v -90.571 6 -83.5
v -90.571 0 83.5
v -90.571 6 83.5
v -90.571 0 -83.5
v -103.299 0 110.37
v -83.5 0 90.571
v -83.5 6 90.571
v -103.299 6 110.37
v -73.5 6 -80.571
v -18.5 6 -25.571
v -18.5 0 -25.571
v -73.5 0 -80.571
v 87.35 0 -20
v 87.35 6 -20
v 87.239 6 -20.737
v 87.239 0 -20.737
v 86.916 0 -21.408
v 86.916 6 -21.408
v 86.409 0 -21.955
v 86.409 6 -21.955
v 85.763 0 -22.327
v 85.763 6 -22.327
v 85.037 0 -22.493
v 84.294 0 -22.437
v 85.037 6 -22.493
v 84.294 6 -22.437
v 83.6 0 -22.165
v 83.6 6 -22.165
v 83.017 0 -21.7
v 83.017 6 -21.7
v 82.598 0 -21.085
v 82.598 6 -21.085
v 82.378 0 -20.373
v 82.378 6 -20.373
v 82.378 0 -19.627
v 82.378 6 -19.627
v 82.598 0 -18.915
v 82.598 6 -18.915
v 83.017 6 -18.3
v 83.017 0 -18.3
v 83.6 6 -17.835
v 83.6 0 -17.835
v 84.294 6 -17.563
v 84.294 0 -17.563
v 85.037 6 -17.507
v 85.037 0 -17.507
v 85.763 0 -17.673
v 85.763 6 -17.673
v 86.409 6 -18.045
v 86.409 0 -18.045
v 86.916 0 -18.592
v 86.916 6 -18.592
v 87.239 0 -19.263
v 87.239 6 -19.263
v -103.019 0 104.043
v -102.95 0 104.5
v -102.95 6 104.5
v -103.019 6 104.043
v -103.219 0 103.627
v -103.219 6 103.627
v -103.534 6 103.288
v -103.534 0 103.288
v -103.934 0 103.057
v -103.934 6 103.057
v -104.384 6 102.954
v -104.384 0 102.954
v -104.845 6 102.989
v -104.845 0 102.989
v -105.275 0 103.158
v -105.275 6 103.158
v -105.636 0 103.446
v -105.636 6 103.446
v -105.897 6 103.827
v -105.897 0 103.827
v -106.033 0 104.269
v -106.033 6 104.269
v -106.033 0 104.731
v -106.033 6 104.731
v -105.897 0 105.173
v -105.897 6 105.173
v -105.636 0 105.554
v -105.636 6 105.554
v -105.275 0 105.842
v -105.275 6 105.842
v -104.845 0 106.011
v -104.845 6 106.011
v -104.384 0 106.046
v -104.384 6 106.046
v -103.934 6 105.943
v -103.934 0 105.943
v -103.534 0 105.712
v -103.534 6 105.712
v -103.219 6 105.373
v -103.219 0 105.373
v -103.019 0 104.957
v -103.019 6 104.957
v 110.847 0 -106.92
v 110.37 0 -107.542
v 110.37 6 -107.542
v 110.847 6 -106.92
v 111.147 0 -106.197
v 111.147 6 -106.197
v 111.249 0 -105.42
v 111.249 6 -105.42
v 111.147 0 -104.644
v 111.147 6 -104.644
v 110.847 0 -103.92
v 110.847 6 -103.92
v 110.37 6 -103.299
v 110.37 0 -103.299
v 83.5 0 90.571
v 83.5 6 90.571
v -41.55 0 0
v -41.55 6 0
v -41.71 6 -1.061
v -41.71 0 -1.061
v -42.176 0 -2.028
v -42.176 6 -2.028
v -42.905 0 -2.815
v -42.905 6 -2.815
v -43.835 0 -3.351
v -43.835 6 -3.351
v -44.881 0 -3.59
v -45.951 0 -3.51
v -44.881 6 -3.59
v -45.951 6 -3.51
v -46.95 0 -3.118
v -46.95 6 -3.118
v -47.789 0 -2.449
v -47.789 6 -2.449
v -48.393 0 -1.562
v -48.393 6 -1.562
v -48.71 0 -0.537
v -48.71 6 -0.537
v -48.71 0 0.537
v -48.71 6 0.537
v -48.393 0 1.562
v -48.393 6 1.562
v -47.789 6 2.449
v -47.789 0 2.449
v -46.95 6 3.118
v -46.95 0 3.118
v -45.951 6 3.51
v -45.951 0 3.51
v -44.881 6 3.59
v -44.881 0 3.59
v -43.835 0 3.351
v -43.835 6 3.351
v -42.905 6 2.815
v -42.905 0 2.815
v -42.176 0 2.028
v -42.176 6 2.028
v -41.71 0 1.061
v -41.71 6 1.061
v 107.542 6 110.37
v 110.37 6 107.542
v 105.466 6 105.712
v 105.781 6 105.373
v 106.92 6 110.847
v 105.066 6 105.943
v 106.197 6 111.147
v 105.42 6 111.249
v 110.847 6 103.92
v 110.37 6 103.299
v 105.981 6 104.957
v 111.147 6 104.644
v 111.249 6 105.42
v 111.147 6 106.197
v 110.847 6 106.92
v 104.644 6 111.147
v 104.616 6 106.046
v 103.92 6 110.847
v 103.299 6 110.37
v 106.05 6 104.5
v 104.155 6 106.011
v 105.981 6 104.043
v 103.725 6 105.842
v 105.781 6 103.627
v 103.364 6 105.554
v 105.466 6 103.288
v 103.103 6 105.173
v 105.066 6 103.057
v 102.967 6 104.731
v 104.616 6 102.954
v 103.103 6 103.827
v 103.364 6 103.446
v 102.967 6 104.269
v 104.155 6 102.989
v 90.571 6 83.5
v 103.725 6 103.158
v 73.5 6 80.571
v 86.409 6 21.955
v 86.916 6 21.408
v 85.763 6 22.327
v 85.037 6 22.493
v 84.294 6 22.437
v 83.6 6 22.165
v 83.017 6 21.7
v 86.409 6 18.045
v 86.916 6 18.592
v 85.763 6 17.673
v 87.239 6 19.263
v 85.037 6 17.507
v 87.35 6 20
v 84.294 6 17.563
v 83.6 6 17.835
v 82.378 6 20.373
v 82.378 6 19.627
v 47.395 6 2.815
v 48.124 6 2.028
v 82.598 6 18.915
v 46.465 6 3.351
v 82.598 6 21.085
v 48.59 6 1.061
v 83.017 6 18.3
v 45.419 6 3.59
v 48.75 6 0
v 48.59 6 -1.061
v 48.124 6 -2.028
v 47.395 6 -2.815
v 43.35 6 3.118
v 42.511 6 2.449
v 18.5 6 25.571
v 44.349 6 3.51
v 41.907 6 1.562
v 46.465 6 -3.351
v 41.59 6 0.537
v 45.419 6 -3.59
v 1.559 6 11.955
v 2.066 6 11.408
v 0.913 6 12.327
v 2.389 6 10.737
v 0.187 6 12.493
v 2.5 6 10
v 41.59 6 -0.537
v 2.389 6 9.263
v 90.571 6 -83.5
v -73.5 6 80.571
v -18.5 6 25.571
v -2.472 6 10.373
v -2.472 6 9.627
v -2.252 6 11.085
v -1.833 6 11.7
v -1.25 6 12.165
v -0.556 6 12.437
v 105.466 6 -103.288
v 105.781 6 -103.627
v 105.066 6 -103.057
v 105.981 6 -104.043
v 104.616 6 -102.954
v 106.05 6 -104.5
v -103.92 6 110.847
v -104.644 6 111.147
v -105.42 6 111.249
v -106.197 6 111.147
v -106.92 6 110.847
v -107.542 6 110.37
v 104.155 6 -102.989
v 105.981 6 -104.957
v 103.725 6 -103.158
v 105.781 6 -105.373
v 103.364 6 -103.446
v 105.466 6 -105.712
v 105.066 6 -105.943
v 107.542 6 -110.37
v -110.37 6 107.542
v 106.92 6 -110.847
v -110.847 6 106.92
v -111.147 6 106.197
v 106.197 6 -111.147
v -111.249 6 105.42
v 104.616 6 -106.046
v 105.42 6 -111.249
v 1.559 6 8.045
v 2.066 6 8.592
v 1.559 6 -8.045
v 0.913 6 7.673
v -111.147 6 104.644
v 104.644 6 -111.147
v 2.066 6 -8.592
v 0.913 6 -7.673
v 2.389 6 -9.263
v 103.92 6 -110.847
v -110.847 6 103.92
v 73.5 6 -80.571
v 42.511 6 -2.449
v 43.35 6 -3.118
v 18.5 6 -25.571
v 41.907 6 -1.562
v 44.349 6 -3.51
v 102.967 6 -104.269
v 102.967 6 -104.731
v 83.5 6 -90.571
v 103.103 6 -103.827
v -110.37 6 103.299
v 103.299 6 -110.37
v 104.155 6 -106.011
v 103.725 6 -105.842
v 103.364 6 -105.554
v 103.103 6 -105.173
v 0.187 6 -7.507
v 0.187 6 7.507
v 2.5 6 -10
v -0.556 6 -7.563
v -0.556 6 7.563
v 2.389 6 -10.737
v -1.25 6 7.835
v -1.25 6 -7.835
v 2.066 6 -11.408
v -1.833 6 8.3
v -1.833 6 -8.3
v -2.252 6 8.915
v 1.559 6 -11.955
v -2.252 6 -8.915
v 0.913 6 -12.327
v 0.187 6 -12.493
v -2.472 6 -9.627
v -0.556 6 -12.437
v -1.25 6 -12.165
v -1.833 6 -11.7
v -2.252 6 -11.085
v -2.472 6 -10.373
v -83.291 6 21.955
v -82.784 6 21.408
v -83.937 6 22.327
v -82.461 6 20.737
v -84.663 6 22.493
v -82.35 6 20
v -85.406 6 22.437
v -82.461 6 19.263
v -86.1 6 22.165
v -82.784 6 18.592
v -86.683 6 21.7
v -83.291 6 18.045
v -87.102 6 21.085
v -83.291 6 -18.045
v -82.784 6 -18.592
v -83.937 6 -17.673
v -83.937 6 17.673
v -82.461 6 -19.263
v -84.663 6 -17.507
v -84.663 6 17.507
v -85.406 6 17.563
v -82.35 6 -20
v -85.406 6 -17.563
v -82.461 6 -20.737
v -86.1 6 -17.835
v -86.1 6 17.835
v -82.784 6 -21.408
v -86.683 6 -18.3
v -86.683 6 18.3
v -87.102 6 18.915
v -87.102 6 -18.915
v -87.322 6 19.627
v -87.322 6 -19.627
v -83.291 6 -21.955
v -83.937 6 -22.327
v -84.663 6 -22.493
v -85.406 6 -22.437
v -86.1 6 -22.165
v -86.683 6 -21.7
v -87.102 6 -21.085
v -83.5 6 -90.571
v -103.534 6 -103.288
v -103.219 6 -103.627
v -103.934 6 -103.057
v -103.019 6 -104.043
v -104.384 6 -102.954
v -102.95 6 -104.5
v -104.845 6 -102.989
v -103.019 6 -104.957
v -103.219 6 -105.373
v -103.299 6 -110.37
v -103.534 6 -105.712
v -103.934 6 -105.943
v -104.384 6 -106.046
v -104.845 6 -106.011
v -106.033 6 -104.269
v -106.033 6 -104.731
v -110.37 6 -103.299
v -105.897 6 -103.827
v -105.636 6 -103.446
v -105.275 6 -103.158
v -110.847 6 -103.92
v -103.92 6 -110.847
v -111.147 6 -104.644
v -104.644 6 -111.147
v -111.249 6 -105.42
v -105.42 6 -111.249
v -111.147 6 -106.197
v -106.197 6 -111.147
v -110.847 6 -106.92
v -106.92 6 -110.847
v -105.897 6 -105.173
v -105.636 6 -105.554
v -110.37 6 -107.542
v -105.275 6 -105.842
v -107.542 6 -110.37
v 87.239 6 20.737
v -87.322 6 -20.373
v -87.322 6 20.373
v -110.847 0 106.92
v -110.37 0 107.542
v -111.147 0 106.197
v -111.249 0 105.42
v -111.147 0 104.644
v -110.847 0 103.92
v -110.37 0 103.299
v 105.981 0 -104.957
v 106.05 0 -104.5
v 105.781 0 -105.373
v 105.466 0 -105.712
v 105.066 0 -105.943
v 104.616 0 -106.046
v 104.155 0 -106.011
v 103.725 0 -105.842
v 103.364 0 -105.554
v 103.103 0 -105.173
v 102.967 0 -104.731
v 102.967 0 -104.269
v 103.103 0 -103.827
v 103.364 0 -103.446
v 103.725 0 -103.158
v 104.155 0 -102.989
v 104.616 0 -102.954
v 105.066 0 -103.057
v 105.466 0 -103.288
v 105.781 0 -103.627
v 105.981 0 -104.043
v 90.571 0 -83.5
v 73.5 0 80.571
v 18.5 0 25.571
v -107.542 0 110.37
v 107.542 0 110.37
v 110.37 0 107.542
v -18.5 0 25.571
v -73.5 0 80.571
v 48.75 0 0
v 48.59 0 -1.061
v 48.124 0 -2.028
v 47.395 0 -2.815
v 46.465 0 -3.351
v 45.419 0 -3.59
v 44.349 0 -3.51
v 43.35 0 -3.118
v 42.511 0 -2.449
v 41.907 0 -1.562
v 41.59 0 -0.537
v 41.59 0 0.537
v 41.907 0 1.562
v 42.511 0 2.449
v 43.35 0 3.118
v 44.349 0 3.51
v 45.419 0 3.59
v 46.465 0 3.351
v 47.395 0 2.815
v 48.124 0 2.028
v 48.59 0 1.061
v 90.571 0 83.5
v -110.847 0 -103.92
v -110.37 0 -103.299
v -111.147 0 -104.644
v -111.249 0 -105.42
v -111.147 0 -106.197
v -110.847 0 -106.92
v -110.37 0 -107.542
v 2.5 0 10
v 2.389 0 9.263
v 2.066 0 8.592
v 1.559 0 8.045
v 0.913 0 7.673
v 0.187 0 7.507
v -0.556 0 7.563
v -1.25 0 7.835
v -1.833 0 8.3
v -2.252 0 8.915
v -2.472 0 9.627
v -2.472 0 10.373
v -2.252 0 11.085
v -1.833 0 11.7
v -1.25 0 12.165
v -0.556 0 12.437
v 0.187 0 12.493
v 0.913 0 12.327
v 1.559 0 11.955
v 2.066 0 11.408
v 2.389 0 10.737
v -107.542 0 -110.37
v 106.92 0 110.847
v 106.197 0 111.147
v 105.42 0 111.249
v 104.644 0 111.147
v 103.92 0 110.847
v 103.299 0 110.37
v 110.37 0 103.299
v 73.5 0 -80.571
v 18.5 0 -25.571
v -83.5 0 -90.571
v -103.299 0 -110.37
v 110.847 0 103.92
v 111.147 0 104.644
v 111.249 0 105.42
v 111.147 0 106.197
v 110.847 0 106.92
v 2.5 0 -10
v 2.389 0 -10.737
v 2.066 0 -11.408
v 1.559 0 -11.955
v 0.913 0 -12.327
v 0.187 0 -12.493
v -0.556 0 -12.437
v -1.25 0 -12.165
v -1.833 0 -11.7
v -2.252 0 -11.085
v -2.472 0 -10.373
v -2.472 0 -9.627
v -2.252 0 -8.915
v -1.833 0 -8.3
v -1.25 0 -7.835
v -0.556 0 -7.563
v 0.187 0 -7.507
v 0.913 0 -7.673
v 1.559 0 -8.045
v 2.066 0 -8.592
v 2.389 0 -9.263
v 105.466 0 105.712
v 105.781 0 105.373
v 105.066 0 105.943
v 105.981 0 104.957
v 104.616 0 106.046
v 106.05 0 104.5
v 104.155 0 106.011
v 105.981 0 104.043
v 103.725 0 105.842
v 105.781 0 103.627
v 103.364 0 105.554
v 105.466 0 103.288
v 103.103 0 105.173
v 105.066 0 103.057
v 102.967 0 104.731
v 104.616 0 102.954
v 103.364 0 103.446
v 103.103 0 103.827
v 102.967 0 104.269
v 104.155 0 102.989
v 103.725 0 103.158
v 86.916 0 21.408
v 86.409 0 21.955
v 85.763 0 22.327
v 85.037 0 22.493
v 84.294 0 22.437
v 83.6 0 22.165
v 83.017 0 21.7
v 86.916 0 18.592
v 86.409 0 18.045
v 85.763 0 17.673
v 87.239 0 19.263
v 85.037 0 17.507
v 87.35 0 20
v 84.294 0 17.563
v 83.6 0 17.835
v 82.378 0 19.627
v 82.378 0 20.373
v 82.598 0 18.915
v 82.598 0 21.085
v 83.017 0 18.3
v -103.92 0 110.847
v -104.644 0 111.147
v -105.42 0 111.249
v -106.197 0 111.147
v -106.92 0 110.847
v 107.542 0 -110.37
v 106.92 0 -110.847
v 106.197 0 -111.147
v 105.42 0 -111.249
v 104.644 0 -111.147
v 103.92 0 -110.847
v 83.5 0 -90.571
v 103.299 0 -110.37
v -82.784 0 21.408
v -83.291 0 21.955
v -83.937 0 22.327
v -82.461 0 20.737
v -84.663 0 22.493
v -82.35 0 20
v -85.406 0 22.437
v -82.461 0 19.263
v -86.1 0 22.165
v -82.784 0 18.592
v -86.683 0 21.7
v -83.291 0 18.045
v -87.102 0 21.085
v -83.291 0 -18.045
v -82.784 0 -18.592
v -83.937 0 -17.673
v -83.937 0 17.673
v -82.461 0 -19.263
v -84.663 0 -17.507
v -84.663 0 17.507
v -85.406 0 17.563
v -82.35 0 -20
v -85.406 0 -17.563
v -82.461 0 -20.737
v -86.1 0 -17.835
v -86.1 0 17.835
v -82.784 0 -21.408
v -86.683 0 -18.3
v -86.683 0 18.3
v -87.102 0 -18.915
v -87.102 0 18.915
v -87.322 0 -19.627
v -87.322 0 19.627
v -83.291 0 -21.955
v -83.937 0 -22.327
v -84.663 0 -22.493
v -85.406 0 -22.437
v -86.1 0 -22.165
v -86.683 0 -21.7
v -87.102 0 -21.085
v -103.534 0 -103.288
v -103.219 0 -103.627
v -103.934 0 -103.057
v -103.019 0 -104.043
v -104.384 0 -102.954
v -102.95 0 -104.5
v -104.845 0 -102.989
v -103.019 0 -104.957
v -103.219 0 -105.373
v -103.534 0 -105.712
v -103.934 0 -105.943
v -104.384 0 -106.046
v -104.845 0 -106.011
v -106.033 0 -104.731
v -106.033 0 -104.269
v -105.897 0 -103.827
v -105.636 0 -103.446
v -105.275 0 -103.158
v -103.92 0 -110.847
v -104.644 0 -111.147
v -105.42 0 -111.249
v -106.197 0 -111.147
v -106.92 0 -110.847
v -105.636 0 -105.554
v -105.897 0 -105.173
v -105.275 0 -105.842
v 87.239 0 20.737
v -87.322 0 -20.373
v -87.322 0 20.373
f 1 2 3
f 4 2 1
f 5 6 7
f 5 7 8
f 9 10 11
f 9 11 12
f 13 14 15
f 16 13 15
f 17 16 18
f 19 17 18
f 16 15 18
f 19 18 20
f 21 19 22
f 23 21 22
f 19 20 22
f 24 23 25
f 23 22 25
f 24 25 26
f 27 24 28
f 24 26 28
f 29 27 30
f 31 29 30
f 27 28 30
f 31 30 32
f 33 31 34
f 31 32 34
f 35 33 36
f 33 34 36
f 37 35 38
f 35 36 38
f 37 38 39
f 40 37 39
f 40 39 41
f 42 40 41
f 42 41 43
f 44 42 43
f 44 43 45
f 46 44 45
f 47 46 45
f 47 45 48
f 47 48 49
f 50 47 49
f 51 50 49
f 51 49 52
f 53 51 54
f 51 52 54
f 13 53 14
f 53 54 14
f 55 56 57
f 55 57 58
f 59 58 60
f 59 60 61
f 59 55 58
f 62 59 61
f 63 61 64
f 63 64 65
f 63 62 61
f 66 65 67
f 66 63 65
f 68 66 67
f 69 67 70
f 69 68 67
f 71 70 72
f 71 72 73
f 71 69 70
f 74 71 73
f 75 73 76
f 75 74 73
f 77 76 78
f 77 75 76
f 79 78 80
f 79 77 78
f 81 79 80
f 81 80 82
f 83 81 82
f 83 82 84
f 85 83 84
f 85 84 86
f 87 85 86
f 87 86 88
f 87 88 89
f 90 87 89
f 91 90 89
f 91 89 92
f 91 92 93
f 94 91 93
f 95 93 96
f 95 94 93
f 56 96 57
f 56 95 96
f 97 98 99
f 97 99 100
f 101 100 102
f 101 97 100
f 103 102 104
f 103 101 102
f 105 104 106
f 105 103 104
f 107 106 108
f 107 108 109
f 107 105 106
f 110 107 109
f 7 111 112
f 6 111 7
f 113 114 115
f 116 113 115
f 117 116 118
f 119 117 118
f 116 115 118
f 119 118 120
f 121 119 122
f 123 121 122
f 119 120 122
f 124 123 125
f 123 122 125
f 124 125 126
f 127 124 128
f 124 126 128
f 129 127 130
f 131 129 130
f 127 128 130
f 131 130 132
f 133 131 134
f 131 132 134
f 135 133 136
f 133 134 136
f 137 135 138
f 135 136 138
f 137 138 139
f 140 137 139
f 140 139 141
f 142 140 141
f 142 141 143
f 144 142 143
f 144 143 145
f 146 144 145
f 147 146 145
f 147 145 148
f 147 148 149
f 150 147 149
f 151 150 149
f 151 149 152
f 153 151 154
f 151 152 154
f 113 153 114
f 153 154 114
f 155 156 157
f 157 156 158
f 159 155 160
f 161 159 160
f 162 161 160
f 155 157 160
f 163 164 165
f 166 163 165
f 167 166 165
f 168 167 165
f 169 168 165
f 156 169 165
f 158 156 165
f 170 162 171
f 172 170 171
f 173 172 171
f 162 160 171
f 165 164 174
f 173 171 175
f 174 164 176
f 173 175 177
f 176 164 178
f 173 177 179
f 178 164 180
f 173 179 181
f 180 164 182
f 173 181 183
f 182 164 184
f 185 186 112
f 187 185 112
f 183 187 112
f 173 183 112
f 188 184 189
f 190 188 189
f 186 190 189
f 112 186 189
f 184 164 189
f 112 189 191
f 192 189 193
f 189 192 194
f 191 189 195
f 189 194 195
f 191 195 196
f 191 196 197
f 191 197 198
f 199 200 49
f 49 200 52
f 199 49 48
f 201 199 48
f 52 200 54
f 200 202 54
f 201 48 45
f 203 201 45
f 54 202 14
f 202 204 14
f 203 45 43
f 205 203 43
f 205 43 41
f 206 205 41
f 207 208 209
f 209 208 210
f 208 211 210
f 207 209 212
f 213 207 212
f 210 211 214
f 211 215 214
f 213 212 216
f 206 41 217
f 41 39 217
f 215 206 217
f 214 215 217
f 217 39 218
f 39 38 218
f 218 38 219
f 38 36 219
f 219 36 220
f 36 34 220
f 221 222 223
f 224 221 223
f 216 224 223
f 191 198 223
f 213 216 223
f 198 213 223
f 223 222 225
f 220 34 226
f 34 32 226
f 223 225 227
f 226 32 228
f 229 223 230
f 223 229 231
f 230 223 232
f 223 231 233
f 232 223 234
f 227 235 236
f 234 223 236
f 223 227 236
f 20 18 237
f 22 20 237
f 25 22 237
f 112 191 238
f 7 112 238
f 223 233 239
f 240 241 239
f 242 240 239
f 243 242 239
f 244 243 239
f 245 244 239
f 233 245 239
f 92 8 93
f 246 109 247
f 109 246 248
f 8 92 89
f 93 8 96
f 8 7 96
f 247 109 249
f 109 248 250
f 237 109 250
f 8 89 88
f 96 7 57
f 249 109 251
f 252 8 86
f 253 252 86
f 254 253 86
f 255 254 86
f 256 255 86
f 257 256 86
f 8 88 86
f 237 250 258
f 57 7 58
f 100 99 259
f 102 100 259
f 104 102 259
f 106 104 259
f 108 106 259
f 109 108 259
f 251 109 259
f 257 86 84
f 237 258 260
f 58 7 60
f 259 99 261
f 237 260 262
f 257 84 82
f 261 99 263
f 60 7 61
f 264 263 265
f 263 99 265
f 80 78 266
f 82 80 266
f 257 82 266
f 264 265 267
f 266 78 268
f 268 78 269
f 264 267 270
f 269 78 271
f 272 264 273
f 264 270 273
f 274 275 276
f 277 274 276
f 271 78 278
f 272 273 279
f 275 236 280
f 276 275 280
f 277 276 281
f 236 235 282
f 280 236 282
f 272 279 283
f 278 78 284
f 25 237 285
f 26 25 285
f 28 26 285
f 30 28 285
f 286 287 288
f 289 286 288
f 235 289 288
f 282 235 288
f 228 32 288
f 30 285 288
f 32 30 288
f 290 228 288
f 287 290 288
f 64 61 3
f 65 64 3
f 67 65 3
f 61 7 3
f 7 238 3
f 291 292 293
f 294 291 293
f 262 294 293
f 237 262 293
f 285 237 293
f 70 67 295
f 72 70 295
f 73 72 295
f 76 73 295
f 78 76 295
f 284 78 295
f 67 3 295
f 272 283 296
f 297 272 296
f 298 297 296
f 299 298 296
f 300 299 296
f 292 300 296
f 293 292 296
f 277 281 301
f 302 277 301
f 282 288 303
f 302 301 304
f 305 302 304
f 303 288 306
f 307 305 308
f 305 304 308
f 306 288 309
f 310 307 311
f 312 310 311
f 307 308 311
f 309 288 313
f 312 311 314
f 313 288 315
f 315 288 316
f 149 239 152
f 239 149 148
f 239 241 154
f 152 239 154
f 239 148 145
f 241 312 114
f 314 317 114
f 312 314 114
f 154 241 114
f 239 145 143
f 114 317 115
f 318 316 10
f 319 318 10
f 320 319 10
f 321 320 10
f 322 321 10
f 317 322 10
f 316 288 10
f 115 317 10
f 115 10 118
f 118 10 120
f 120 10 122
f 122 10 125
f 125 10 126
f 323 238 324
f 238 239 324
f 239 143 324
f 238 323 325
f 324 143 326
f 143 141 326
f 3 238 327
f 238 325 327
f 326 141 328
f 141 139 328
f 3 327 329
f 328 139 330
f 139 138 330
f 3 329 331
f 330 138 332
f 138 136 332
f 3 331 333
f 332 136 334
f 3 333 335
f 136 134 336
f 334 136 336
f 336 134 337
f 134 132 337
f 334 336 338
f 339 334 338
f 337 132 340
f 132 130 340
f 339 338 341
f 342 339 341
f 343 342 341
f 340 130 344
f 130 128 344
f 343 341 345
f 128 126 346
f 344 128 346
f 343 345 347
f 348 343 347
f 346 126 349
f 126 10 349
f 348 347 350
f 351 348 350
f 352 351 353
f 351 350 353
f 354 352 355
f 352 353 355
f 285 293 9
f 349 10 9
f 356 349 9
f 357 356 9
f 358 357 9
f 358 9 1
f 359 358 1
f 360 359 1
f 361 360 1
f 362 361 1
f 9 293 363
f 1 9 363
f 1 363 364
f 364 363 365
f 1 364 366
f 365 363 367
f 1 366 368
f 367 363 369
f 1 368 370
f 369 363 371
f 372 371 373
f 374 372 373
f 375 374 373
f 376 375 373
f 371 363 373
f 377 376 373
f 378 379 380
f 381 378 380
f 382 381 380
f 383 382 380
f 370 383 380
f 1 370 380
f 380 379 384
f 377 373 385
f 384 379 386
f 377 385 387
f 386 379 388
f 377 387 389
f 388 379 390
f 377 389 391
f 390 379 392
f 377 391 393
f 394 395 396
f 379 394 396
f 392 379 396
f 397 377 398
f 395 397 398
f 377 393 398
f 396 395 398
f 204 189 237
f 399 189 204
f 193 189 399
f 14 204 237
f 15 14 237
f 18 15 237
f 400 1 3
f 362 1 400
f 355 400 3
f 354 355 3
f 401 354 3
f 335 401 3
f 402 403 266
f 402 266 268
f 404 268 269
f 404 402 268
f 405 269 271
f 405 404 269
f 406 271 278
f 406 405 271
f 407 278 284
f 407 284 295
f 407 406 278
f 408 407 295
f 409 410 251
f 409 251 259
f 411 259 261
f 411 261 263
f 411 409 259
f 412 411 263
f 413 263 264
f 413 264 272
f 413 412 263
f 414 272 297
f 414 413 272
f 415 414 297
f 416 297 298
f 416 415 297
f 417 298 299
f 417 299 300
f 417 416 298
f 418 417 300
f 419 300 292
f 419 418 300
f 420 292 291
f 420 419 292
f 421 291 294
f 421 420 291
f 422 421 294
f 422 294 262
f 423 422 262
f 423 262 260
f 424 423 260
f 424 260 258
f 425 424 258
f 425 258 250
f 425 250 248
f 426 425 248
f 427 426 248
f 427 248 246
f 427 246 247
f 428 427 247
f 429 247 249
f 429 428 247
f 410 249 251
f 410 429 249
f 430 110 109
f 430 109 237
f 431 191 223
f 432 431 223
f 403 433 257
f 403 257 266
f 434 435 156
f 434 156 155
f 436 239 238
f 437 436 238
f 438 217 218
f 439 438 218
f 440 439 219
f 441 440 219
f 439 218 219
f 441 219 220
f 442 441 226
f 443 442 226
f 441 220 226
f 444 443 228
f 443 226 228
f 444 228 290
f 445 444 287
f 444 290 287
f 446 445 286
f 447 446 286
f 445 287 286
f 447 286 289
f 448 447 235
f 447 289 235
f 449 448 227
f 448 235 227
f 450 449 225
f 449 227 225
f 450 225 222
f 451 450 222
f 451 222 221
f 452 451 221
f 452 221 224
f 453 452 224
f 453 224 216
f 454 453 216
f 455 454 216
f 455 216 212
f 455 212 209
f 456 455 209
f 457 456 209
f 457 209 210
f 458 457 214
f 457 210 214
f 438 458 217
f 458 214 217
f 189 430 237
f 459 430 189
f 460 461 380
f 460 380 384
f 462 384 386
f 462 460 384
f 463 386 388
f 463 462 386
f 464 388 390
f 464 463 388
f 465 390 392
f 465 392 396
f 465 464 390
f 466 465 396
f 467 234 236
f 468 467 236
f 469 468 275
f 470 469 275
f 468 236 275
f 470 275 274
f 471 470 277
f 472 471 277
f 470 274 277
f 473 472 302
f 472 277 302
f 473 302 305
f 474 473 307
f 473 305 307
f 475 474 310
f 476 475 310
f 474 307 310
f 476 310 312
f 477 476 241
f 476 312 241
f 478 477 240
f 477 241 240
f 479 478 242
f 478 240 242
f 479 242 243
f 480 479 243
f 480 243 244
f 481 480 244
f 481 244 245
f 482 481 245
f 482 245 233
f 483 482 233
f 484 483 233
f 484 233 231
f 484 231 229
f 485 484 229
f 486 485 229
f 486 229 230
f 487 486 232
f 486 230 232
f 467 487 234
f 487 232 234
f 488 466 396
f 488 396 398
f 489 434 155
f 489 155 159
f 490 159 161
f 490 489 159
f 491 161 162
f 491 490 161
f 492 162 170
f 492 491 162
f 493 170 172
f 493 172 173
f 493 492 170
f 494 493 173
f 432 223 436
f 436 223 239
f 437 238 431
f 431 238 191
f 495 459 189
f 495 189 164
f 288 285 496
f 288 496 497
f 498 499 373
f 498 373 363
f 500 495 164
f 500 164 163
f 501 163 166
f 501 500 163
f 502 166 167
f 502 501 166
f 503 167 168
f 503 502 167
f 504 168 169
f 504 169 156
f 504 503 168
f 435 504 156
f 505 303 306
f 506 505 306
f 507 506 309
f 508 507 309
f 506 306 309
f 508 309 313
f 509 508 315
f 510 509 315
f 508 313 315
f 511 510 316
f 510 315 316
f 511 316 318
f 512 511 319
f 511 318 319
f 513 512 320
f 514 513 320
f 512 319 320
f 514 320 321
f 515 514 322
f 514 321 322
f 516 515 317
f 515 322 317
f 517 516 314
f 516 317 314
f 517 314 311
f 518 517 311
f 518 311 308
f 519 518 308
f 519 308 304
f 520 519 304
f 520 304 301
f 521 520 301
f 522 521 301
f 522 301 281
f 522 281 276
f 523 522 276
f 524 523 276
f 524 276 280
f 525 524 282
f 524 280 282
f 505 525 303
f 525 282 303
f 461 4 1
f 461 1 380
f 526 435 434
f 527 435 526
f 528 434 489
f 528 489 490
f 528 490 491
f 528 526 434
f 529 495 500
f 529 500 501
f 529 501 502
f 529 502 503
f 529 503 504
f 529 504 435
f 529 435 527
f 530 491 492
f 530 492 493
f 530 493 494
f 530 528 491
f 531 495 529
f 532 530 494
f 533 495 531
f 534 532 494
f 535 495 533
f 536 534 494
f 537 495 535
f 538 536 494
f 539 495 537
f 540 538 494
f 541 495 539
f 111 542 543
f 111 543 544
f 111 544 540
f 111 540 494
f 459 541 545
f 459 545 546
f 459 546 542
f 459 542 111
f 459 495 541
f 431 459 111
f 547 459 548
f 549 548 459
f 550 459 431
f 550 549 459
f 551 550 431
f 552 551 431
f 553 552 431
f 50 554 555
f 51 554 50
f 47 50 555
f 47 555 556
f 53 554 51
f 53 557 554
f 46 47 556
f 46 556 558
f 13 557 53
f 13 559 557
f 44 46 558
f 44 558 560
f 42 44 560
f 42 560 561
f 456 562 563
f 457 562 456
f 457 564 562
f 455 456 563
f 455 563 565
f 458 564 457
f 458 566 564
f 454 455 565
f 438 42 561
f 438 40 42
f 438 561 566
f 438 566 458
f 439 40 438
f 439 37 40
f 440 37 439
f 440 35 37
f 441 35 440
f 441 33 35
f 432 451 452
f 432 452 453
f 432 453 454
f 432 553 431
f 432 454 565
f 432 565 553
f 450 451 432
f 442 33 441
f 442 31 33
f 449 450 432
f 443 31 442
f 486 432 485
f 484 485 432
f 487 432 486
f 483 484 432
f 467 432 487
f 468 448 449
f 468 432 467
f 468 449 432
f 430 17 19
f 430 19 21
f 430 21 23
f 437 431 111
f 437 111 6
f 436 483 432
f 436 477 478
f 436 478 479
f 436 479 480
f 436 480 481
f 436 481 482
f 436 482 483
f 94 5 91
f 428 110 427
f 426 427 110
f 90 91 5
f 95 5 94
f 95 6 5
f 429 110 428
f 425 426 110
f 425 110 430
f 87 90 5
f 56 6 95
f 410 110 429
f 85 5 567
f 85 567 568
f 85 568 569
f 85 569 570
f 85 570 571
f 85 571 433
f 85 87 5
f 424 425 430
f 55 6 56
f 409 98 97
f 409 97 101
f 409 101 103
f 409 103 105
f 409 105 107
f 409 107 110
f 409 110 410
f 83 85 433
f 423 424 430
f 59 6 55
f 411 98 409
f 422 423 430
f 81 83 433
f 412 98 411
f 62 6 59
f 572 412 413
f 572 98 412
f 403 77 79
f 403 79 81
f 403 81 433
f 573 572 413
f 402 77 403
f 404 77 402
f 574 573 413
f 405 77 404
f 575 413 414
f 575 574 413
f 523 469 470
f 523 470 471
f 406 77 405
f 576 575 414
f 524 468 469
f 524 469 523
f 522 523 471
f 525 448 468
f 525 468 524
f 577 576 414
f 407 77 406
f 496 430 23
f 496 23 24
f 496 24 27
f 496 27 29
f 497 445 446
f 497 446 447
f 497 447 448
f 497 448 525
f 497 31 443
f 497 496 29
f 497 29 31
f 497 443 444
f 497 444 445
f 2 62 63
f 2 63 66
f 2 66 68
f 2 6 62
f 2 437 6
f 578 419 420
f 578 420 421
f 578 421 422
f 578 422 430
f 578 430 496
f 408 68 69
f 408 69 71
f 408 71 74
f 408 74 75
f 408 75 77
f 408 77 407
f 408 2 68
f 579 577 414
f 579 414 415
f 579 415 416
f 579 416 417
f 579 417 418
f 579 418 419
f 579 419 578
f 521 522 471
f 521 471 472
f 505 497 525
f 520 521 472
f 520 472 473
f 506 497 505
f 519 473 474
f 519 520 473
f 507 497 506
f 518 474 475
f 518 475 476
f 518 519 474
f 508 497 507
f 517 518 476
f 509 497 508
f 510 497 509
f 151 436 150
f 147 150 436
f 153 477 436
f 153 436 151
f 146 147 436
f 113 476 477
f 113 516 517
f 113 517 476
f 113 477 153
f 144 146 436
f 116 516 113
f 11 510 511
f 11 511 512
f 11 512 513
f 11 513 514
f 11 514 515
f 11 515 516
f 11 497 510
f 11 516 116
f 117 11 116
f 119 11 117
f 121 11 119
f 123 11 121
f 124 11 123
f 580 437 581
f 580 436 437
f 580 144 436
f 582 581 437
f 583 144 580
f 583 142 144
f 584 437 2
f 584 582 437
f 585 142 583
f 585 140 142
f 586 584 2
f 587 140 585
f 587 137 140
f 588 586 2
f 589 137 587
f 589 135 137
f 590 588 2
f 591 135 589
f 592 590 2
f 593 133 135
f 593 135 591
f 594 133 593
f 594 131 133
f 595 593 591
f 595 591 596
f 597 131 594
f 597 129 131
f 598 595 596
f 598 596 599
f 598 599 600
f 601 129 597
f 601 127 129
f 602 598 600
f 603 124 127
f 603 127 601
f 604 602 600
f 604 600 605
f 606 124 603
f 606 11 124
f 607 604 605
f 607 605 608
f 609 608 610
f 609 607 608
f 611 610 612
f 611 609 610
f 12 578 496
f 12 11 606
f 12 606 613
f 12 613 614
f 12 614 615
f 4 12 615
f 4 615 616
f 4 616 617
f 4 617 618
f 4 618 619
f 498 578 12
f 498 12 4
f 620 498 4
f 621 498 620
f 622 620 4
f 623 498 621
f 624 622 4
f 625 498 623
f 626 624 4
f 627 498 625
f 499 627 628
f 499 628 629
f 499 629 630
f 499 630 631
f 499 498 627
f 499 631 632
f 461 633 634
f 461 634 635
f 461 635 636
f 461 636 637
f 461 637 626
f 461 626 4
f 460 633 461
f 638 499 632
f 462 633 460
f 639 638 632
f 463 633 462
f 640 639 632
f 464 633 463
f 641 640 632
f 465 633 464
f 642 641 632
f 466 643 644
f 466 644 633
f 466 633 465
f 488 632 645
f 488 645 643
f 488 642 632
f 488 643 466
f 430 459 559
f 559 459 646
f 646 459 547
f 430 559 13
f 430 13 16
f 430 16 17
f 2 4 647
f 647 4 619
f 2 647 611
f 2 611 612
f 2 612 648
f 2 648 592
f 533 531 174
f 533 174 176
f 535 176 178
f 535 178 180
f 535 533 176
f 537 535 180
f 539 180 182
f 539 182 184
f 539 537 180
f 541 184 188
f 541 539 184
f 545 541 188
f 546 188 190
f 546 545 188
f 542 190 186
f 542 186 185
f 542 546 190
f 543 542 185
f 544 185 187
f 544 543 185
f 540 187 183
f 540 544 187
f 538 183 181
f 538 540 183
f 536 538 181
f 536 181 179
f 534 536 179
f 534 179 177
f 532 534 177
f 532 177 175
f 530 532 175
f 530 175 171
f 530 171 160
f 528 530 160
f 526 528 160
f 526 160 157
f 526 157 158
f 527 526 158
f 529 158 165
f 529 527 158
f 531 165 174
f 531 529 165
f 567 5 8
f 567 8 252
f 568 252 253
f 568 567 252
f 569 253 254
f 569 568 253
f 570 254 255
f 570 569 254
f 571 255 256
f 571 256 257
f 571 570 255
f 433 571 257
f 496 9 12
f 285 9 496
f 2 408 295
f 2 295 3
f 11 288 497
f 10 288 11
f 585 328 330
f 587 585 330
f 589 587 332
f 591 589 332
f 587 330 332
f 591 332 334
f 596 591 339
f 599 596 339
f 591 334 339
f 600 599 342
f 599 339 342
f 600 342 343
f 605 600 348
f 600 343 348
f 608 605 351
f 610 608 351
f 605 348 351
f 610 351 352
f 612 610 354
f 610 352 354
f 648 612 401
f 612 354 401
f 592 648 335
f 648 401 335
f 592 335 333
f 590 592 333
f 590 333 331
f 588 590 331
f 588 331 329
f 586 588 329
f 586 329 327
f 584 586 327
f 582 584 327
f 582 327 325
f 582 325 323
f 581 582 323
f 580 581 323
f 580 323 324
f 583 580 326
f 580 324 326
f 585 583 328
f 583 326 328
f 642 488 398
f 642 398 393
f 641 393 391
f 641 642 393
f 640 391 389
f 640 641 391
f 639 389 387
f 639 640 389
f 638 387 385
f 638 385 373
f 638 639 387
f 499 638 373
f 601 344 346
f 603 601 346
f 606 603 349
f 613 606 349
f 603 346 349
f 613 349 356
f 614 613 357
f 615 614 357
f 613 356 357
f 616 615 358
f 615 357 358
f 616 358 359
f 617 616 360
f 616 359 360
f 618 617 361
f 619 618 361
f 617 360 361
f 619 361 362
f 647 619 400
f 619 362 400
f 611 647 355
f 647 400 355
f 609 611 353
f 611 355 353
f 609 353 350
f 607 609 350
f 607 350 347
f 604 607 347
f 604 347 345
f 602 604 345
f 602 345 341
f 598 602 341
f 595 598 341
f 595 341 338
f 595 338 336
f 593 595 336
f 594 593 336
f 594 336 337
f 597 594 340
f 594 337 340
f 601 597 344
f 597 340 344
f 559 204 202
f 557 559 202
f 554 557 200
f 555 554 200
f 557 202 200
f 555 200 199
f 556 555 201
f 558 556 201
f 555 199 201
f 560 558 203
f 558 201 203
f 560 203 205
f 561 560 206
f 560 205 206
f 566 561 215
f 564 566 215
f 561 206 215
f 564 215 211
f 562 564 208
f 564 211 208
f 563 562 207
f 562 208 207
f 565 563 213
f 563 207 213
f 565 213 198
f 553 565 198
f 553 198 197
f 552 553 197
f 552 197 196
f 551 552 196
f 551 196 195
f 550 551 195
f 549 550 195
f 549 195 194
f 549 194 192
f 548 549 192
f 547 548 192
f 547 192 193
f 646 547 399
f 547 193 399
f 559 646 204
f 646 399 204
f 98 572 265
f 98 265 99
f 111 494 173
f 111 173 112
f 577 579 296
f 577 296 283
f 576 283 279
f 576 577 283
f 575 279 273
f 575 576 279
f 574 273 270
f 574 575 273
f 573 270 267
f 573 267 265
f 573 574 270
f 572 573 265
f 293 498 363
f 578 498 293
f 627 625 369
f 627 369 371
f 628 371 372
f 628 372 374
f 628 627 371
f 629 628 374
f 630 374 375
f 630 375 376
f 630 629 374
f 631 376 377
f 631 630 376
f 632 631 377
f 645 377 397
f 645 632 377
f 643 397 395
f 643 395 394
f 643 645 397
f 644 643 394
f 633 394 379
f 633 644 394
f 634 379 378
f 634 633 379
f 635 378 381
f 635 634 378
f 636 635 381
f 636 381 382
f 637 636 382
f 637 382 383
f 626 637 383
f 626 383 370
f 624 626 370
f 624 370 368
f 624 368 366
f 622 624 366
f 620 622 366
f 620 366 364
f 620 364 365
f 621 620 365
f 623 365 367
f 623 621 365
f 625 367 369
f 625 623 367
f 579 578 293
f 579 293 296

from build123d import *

# Parameters (mm, degrees)
BOSS_EXTRUDE2_DEPTH = 6
SKETCH1_6_R         = 1.55
CUT_EXTRUDE4_DEPTH  = 6
SKETCH2_R           = 2.5
SKETCH2_R_2         = 3.6
CUT_EXTRUDE5_DEPTH  = 6
SKETCH3_R           = 2.5
CUT_EXTRUDE6_DEPTH  = 6
CUT_EXTRUDE7_DEPTH  = 6


with BuildPart() as part:
    # Sketch1 → Boss-Extrude2 (new body)
    with BuildSketch(Plane(origin=(0, 0, 0), x_dir=(1, 0, 0), z_dir=(0, 1, 0))):
        with BuildLine():
            Line((-83.5, 90.571067812), (83.5, 90.571067812))
            Line((83.5, 90.571067812), (103.298989873, 110.370057685))
            ThreePointArc((103.298989873, 110.370057685), (105.420310217, 111.248737342), (107.54163056, 110.370057685))
            Line((107.54163056, 110.370057685), (110.370057685, 107.54163056))
            ThreePointArc((110.370057685, 107.54163056), (111.248737342, 105.420310217), (110.370057685, 103.298989873))
            Line((110.370057685, 103.298989873), (90.571067812, 83.5))
            Line((90.571067812, 83.5), (90.571067812, -83.5))
            Line((90.571067812, -83.5), (110.370057685, -103.298989873))
            ThreePointArc((110.370057685, -103.298989873), (111.248737342, -105.420310217), (110.370057685, -107.54163056))
            Line((110.370057685, -107.54163056), (107.54163056, -110.370057685))
            ThreePointArc((107.54163056, -110.370057685), (105.420310217, -111.248737342), (103.298989873, -110.370057685))
            Line((103.298989873, -110.370057685), (83.5, -90.571067812))
            Line((83.5, -90.571067812), (-83.5, -90.571067812))
            Line((-83.5, -90.571067812), (-103.298989873, -110.370057685))
            ThreePointArc((-103.298989873, -110.370057685), (-105.420310217, -111.248737342), (-107.54163056, -110.370057685))
            Line((-107.54163056, -110.370057685), (-110.370057685, -107.54163056))
            ThreePointArc((-110.370057685, -107.54163056), (-111.248737342, -105.420310217), (-110.370057685, -103.298989873))
            Line((-110.370057685, -103.298989873), (-90.571067812, -83.5))
            Line((-90.571067812, -83.5), (-90.571067812, 83.5))
            Line((-90.571067812, 83.5), (-110.370057685, 103.298989873))
            ThreePointArc((-110.370057685, 103.298989873), (-111.248737342, 105.420310217), (-110.370057685, 107.54163056))
            Line((-110.370057685, 107.54163056), (-107.54163056, 110.370057685))
            ThreePointArc((-107.54163056, 110.370057685), (-105.420310217, 111.248737342), (-103.298989873, 110.370057685))
            Line((-103.298989873, 110.370057685), (-83.5, 90.571067812))
        make_face()
    extrude(amount=BOSS_EXTRUDE2_DEPTH)

    # Sketch1<6> → Cut-Extrude4 (cut)
    with BuildSketch(Plane(origin=(0, 0, 0), x_dir=(1, 0, 0), z_dir=(0, 1, 0))):
        with Locations((-104.5, 104.5)):
            Circle(SKETCH1_6_R)
        with Locations((104.5, 104.5)):
            Circle(SKETCH1_6_R)
        with Locations((104.5, -104.5)):
            Circle(SKETCH1_6_R)
        with Locations((-104.5, -104.5)):
            Circle(SKETCH1_6_R)
    extrude(amount=CUT_EXTRUDE4_DEPTH, mode=Mode.SUBTRACT)

    # Sketch2 → Cut-Extrude5 (cut)
    with BuildSketch(Plane(origin=(0, 6, 0), x_dir=(1, 0, 0), z_dir=(0, 1, 0))):
        with Locations((-84.85, 20)):
            Circle(SKETCH2_R)
        with Locations((-84.85, -20)):
            Circle(SKETCH2_R)
        with Locations((45.15, 0)):
            Circle(SKETCH2_R_2)
        with Locations((84.85, -20)):
            Circle(SKETCH2_R)
        with Locations((-45.15, 0)):
            Circle(SKETCH2_R_2)
        with Locations((84.85, 20)):
            Circle(SKETCH2_R)
    extrude(amount=-CUT_EXTRUDE5_DEPTH, mode=Mode.SUBTRACT)

    # Sketch3 → Cut-Extrude6 (cut)
    with BuildSketch(Plane(origin=(0, 6, 0), x_dir=(1, 0, 0), z_dir=(0, 1, 0))):
        with Locations((0, 10)):
            Circle(SKETCH3_R)
        with Locations((0, -10)):
            Circle(SKETCH3_R)
    extrude(amount=-CUT_EXTRUDE6_DEPTH, mode=Mode.SUBTRACT)

    # Sketch4 → Cut-Extrude7 (cut)
    with BuildSketch(Plane(origin=(0, 6, 0), x_dir=(1, 0, 0), z_dir=(0, 1, 0))):
        Polygon((-73.5, 80.571067812), (73.5, 80.571067812), (18.5, 25.571067812), (-18.5, 25.571067812), align=None)
        Polygon((73.5, -80.571067812), (18.5, -25.571067812), (-18.5, -25.571067812), (-73.5, -80.571067812), align=None)
    extrude(amount=-CUT_EXTRUDE7_DEPTH, mode=Mode.SUBTRACT)


solid = part.part
